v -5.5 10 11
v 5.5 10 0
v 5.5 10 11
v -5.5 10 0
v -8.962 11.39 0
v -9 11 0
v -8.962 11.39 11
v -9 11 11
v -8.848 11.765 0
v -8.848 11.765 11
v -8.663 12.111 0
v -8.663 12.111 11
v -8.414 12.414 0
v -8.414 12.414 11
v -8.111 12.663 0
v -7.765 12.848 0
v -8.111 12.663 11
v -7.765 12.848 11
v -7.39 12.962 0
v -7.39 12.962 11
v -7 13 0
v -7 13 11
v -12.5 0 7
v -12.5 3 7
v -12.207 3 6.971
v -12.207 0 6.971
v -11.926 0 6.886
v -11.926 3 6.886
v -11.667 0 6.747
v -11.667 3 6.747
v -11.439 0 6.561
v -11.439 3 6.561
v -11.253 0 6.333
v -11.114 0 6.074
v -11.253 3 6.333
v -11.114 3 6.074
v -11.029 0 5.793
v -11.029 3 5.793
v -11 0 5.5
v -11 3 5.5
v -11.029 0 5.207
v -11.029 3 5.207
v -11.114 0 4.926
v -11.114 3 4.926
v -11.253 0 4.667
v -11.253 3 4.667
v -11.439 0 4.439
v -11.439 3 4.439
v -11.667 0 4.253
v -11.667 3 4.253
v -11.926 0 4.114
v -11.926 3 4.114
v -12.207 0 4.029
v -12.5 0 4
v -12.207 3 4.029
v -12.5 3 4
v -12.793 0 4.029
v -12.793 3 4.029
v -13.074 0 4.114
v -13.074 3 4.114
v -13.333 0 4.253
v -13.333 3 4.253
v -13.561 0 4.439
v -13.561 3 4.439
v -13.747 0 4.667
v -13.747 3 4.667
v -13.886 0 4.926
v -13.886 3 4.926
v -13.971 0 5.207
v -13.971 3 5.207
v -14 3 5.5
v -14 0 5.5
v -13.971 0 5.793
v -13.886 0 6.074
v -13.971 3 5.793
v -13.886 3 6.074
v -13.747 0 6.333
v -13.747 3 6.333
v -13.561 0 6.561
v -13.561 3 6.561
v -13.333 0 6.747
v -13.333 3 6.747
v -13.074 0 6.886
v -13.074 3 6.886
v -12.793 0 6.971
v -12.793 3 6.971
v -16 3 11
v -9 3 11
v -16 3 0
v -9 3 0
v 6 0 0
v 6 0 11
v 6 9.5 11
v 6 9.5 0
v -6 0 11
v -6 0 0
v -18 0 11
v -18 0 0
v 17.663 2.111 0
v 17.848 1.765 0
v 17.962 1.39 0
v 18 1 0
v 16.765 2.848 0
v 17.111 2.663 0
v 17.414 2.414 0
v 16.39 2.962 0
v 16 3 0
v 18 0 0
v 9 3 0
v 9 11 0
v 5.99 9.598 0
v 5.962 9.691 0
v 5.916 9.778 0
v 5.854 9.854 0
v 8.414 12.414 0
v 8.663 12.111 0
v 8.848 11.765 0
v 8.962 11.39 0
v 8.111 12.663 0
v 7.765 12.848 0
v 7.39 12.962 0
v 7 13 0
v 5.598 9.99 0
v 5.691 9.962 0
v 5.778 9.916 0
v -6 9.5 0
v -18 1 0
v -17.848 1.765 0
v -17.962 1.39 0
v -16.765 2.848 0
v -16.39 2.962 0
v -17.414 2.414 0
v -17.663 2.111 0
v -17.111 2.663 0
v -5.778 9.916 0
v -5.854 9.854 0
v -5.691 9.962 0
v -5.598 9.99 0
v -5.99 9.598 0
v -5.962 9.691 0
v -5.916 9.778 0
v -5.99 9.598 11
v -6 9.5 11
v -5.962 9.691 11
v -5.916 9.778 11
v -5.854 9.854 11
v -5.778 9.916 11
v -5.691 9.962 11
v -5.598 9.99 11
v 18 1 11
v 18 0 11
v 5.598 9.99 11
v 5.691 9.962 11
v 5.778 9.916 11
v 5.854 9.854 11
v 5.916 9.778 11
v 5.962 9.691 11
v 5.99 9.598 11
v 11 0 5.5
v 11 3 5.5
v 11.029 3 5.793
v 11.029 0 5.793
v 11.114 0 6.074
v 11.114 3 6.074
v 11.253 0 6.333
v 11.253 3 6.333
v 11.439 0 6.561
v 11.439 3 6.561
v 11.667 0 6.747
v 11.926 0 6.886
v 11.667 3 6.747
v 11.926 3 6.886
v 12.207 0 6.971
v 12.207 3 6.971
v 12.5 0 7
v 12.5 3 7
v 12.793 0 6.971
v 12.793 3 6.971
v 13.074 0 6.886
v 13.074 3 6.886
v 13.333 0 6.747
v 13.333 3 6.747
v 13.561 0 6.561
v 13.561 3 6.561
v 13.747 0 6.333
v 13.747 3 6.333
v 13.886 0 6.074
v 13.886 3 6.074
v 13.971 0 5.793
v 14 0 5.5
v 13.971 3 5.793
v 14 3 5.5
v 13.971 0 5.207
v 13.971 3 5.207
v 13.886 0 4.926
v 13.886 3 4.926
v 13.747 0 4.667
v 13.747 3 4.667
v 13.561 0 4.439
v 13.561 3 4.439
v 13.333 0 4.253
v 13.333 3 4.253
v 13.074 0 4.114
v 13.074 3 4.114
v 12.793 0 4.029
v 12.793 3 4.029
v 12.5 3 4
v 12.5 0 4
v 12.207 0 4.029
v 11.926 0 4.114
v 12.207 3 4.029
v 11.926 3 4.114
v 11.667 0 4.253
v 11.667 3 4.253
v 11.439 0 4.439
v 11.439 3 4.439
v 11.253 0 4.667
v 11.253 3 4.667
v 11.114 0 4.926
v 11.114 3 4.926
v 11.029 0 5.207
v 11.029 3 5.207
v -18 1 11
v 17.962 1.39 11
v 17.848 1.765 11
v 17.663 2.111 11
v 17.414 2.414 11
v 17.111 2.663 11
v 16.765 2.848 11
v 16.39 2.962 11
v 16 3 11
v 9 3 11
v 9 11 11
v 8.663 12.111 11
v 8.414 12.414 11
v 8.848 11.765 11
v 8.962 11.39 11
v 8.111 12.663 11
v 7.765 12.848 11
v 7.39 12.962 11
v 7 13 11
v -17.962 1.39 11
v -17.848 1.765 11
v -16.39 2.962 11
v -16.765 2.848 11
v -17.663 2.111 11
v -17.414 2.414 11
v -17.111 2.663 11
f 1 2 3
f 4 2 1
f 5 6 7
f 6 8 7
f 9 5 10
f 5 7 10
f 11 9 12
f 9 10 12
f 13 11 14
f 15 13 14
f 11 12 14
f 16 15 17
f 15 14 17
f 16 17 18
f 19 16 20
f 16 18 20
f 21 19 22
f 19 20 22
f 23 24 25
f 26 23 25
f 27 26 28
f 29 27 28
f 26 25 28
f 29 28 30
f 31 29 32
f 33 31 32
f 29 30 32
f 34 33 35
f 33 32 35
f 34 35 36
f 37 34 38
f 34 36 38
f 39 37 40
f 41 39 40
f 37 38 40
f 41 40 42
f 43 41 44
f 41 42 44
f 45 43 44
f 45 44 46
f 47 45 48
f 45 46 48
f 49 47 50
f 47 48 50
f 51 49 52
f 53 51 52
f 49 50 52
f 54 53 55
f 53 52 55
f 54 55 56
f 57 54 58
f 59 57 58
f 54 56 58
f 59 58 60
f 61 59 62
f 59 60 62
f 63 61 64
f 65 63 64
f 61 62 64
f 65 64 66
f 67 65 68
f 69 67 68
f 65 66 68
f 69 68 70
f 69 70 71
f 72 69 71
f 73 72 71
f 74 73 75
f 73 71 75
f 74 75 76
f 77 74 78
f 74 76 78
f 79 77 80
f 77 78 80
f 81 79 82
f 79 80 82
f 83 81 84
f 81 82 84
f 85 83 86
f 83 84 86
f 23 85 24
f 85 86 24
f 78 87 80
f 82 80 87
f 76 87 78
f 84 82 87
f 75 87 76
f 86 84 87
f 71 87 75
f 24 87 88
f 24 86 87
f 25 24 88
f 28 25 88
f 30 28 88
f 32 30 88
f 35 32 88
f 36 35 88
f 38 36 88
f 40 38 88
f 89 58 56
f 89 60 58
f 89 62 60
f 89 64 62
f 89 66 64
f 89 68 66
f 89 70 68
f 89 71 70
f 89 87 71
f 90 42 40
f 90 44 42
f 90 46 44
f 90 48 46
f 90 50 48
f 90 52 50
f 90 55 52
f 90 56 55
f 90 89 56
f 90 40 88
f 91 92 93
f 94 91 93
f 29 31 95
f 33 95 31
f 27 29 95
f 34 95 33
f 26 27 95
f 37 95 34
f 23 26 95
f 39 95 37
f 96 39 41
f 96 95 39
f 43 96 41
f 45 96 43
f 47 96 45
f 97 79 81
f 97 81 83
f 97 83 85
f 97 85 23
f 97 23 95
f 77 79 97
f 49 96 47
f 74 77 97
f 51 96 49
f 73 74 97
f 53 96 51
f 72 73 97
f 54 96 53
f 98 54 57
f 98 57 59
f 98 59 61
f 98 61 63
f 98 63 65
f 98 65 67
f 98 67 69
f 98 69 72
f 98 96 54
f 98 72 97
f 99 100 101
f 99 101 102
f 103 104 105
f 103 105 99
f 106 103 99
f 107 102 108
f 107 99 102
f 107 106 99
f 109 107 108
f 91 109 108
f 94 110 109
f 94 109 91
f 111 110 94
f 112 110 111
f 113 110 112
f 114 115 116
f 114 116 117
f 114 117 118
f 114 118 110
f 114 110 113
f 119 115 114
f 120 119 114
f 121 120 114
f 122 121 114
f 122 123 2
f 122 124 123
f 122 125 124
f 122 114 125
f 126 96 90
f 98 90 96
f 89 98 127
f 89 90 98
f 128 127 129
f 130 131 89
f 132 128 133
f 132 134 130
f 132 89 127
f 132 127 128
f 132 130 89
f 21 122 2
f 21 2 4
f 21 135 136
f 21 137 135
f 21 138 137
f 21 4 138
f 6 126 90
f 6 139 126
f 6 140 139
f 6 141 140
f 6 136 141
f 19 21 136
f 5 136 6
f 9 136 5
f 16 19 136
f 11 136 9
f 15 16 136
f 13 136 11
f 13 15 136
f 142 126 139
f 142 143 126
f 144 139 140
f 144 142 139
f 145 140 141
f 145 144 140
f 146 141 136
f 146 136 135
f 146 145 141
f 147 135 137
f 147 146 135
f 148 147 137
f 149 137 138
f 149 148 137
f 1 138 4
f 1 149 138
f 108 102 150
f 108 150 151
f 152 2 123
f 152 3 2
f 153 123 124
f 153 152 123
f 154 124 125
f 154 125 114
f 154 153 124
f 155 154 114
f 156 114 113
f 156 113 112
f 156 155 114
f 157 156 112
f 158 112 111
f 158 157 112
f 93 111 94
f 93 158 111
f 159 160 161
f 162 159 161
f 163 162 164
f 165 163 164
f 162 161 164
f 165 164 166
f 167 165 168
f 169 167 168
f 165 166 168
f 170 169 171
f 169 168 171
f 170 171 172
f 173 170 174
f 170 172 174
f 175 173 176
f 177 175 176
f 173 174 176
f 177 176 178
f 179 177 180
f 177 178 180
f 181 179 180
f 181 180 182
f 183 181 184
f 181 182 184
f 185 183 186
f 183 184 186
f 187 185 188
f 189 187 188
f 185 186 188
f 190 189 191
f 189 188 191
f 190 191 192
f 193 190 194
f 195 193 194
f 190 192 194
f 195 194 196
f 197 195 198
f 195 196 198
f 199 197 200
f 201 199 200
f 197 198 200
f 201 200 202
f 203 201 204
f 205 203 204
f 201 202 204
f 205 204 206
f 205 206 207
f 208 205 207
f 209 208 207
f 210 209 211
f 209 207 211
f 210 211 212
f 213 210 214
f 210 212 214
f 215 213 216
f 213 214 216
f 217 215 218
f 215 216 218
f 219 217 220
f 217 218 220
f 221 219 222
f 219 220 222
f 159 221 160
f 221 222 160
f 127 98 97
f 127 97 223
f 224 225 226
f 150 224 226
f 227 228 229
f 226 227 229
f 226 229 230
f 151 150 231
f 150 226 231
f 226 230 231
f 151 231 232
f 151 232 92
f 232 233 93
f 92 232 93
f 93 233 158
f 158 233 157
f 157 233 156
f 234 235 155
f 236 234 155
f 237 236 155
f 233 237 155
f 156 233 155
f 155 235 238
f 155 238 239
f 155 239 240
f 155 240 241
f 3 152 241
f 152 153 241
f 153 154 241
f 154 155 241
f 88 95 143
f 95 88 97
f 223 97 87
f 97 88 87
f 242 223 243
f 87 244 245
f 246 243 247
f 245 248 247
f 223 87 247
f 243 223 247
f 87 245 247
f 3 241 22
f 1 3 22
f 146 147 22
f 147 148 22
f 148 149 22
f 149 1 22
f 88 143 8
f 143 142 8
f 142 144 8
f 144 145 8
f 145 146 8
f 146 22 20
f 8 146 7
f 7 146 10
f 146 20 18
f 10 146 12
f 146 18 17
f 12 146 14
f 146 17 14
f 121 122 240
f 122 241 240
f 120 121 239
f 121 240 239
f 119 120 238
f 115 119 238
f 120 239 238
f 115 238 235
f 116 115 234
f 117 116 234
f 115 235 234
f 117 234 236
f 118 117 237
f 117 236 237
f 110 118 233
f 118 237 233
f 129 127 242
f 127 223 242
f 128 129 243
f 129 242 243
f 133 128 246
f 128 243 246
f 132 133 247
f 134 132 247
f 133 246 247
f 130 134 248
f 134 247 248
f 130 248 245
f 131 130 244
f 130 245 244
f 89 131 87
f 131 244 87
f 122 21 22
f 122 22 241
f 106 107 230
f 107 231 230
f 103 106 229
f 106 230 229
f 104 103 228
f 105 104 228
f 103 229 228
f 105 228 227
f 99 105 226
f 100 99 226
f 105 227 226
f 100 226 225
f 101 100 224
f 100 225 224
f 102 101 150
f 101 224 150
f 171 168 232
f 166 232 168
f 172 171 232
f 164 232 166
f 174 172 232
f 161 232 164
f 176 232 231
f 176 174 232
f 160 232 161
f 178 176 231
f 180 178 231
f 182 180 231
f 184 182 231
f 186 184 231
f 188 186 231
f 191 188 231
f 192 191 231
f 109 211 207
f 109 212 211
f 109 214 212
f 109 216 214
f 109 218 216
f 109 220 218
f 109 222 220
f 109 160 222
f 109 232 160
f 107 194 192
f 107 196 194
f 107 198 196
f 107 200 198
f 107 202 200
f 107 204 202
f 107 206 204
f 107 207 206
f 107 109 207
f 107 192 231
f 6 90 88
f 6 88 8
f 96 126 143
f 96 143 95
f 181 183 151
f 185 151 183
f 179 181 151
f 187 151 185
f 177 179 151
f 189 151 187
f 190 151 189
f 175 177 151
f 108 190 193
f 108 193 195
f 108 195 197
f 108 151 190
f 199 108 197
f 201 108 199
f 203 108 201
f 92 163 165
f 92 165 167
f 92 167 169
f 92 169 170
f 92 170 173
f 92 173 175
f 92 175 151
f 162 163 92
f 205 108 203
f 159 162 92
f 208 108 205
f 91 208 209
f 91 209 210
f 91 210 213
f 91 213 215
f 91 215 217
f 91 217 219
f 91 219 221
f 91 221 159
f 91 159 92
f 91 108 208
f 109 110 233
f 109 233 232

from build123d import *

# Parameters (mm, degrees)
BOSS_EXTRUDE1_DEPTH = 11
FILLET1_R           = 2
FILLET2_R           = 0.5
SKETCH2_R           = 1.5
CUT_EXTRUDE1_DEPTH  = 3


with BuildPart() as part:
    # Sketch1 → Boss-Extrude1 (new body)
    with BuildSketch(Plane.XY):
        Polygon((6, 10), (-6, 10), (-6, 0), (-18, 0), (-18, 3), (-9, 3), (-9, 13), (9, 13), (9, 3), (18, 3), (18, 0), (6, 0), align=None)
    extrude(amount=BOSS_EXTRUDE1_DEPTH)

    # Fillet1
    fillet1_edges = [part.edges().sort_by_distance(p)[0] for p in [
        (-18, 3, 5.5),
        (-9, 13, 5.5),
        (9, 13, 5.5),
        (18, 3, 5.5),
    ]]
    fillet(fillet1_edges, radius=FILLET1_R)

    # Fillet2
    fillet2_edges = [part.edges().sort_by_distance(p)[0] for p in [
        (6, 10, 5.5),
        (-6, 10, 5.5),
    ]]
    fillet(fillet2_edges, radius=FILLET2_R)

    # Sketch2 → Cut-Extrude1 (cut)
    with BuildSketch(Plane(origin=(0, 3, 0), x_dir=(1, 0, 0), z_dir=(0, 1, 0))):
        with Locations(Location((-12.5, -5.5, 0), (0, 0, 270))):
            Circle(SKETCH2_R)
        with Locations(Location((12.5, -5.5, 0), (0, 0, 180))):
            Circle(SKETCH2_R)
    extrude(amount=-CUT_EXTRUDE1_DEPTH, mode=Mode.SUBTRACT)


solid = part.part
